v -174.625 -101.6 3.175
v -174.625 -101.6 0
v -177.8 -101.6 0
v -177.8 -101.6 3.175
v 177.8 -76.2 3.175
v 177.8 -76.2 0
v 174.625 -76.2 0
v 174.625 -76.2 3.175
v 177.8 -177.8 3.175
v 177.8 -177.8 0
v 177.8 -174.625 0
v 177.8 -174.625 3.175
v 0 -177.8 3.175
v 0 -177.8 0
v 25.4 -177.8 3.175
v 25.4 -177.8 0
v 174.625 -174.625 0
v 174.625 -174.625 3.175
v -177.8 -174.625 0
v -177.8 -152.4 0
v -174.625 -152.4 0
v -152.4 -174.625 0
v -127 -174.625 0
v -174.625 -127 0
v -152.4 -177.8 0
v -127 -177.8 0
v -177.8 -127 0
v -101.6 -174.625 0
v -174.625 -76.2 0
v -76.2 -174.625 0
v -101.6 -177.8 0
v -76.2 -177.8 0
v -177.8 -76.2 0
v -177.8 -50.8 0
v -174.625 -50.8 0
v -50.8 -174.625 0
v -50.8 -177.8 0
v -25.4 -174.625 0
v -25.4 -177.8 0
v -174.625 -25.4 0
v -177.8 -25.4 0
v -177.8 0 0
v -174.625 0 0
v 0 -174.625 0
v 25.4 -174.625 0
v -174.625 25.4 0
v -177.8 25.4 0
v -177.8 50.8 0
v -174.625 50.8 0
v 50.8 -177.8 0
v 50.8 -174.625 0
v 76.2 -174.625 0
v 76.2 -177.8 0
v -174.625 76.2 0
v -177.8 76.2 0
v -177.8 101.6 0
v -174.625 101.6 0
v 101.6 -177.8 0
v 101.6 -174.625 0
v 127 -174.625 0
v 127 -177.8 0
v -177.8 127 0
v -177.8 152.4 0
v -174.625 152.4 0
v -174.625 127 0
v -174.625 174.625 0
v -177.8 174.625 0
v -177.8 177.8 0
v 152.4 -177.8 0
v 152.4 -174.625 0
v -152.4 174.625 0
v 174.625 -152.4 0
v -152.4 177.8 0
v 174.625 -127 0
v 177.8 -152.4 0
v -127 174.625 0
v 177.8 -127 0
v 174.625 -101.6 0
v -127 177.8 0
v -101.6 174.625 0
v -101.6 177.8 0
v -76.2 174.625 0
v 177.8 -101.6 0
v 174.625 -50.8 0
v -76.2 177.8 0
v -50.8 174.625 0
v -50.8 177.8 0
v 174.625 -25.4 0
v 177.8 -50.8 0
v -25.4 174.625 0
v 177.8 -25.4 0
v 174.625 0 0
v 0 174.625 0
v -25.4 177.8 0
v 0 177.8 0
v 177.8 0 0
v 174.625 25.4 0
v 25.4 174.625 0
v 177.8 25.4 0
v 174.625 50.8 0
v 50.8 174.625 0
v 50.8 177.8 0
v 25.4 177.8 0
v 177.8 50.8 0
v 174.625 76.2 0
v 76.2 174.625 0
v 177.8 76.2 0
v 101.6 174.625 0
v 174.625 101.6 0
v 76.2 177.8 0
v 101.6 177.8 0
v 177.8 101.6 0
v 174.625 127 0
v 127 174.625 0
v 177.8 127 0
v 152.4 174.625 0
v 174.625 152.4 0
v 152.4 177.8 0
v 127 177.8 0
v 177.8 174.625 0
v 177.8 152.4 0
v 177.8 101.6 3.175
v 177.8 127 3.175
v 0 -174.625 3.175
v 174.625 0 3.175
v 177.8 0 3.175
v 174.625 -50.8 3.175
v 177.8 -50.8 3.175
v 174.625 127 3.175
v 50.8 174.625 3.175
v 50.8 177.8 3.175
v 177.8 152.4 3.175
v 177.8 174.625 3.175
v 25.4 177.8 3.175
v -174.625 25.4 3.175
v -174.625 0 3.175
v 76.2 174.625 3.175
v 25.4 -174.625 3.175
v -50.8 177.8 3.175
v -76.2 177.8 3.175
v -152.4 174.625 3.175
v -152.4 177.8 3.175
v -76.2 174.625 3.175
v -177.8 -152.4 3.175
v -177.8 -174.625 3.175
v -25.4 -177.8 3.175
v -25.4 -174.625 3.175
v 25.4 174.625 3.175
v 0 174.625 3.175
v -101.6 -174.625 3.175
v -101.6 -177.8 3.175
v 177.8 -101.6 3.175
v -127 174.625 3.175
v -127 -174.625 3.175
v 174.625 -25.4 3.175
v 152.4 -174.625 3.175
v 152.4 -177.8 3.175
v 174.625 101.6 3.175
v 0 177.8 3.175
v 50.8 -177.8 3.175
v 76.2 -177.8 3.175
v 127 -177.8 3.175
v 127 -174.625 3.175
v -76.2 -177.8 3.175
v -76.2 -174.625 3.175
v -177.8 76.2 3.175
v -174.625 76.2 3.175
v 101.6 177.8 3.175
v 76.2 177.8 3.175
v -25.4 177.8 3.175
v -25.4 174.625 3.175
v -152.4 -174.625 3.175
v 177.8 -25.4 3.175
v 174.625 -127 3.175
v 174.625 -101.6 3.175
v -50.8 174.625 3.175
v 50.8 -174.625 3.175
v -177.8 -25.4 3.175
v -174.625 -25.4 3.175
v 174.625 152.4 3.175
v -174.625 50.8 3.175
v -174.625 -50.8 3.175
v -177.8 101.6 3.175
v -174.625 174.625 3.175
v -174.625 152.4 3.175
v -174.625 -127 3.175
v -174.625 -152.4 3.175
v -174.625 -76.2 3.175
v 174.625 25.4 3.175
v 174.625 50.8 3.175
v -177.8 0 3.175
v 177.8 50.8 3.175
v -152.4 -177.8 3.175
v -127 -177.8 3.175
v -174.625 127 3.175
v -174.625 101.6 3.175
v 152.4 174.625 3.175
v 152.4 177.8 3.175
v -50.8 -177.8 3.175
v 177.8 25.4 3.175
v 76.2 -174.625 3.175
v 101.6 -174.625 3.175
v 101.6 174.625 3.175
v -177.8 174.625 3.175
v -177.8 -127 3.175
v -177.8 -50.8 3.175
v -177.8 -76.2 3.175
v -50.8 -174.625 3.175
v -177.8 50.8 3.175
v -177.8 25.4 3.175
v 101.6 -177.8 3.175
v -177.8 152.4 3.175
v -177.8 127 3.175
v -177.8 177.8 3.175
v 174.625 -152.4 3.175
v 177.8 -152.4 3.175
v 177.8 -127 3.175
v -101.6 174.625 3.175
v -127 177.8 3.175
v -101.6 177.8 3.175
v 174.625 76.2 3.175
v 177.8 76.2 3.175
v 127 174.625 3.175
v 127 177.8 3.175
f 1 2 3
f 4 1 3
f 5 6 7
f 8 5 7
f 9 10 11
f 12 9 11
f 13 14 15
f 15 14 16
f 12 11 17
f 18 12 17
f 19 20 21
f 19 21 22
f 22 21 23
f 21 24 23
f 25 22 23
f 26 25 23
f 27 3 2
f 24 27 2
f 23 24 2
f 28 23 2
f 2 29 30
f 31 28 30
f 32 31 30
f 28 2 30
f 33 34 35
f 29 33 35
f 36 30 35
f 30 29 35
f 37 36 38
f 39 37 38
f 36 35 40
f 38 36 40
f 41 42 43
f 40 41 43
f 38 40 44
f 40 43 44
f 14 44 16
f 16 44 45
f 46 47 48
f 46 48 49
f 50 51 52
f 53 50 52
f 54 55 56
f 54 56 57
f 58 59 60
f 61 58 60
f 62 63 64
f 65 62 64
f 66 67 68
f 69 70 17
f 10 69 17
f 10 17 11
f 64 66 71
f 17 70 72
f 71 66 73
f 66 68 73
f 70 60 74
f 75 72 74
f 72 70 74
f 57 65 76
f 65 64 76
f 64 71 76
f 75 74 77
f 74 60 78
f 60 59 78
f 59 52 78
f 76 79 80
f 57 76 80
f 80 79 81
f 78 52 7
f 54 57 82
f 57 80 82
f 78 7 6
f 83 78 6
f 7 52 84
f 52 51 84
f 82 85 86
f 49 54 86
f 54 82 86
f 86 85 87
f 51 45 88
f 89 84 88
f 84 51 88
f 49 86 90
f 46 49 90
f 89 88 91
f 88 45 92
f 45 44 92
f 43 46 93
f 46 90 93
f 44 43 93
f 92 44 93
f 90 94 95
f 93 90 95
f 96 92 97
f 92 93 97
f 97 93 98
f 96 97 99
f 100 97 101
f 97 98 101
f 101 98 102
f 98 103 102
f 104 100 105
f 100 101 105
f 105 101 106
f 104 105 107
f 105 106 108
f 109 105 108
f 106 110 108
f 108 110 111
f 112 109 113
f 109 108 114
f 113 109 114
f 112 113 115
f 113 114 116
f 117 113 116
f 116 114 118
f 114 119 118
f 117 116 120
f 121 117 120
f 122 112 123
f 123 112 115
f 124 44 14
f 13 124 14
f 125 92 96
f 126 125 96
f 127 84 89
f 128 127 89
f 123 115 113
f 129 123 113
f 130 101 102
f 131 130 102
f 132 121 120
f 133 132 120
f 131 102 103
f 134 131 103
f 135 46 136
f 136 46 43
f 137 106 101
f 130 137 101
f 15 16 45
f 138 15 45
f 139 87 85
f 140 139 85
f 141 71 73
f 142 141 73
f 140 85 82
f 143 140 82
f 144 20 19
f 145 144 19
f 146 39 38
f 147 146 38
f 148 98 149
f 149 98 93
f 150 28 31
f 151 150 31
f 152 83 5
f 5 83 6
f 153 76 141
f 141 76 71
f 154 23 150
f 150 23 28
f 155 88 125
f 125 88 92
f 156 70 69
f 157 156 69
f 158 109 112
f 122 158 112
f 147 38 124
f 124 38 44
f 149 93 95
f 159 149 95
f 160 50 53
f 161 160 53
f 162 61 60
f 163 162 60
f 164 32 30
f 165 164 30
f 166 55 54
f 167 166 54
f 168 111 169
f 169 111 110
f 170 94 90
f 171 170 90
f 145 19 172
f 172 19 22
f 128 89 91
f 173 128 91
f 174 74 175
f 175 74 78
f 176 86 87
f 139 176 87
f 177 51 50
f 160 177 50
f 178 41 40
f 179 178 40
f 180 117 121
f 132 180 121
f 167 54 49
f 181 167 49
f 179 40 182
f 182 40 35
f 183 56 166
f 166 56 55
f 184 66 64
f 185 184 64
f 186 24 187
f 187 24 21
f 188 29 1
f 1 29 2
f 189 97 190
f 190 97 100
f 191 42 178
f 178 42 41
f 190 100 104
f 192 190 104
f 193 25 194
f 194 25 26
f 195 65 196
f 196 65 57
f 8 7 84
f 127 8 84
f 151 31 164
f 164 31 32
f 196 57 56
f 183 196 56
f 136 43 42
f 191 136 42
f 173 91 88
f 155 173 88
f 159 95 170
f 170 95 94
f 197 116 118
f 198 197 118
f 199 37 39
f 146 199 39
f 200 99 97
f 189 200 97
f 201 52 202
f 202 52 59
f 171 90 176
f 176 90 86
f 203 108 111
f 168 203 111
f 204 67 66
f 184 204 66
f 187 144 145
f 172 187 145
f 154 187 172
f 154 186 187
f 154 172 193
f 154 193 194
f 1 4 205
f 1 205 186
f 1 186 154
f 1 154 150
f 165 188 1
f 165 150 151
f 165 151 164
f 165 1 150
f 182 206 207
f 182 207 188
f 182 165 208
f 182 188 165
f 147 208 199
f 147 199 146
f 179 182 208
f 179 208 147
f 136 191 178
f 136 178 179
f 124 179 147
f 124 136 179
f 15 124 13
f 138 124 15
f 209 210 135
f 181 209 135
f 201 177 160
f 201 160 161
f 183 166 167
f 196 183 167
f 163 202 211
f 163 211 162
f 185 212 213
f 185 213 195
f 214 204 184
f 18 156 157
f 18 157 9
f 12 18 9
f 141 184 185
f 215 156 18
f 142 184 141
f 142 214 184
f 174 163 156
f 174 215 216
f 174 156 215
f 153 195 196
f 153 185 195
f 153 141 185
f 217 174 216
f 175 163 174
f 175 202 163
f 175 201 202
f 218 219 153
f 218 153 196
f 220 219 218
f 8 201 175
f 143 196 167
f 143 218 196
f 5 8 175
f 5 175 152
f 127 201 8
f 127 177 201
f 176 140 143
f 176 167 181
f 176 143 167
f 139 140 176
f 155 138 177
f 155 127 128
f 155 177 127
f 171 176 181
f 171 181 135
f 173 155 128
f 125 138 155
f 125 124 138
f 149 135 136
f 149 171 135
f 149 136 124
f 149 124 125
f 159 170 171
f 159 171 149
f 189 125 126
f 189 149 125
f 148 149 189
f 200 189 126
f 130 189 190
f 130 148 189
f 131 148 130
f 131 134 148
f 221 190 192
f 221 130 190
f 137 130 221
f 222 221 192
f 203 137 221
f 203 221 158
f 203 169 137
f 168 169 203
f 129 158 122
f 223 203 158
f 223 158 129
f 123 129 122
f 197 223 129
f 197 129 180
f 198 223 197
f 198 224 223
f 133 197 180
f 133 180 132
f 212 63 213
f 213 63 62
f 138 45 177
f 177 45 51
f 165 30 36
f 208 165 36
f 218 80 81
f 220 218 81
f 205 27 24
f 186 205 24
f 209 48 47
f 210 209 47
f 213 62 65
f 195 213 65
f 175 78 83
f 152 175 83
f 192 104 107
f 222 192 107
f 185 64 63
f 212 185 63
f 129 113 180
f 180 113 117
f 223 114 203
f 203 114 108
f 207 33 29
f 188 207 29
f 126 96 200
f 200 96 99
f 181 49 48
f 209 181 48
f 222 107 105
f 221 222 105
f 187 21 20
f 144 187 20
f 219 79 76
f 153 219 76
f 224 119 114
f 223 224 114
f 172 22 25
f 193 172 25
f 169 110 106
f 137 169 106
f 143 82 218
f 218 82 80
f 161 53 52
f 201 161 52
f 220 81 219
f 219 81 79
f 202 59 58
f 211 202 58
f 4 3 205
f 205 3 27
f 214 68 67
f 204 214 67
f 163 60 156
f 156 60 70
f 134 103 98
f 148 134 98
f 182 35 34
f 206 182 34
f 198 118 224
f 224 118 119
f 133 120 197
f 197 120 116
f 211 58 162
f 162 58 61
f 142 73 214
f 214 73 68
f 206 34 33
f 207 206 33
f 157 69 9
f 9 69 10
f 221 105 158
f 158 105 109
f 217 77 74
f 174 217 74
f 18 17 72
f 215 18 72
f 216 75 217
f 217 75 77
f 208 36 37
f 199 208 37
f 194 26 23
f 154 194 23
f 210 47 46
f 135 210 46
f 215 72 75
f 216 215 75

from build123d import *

# Parameters (mm, degrees)
F1_DEPTH = 3.175


with BuildPart() as f1:
    # F0 (on Top) → F1 (new body)
    with BuildSketch(Plane.XY):
        Polygon((-152.4, 177.8), (-177.8, 177.8), (-177.8, 174.625), (-174.625, 174.625), (-174.625, 152.4), (-177.8, 152.4), (-177.8, 127), (-174.625, 127), (-174.625, 101.6), (-177.8, 101.6), (-177.8, 76.2), (-174.625, 76.2), (-174.625, 50.8), (-177.8, 50.8), (-177.8, 25.4), (-174.625, 25.4), (-174.625, 0), (-177.8, 0), (-177.8, -25.4), (-174.625, -25.4), (-174.625, -50.8), (-177.8, -50.8), (-177.8, -76.2), (-174.625, -76.2), (-174.625, -101.6), (-177.8, -101.6), (-177.8, -127), (-174.625, -127), (-174.625, -152.4), (-177.8, -152.4), (-177.8, -174.625), (-174.625, -174.625), (-152.4, -174.625), (-152.4, -177.8), (-127, -177.8), (-127, -174.625), (-101.6, -174.625), (-101.6, -177.8), (-76.2, -177.8), (-76.2, -174.625), (-50.8, -174.625), (-50.8, -177.8), (-25.4, -177.8), (-25.4, -174.625), (0, -174.625), (0, -177.8), (25.4, -177.8), (25.4, -174.625), (50.8, -174.625), (50.8, -177.8), (76.2, -177.8), (76.2, -174.625), (101.6, -174.625), (101.6, -177.8), (127, -177.8), (127, -174.625), (152.4, -174.625), (152.4, -177.8), (177.8, -177.8), (177.8, -174.625), (174.625, -174.625), (174.625, -152.4), (177.8, -152.4), (177.8, -127), (174.625, -127), (174.625, -101.6), (177.8, -101.6), (177.8, -76.2), (174.625, -76.2), (174.625, -50.8), (177.8, -50.8), (177.8, -25.4), (174.625, -25.4), (174.625, 0), (177.8, 0), (177.8, 25.4), (174.625, 25.4), (174.625, 50.8), (177.8, 50.8), (177.8, 76.2), (174.625, 76.2), (174.625, 101.6), (177.8, 101.6), (177.8, 127), (174.625, 127), (174.625, 152.4), (177.8, 152.4), (177.8, 174.625), (174.625, 174.625), (152.4, 174.625), (152.4, 177.8), (127, 177.8), (127, 174.625), (101.6, 174.625), (101.6, 177.8), (76.2, 177.8), (76.2, 174.625), (50.8, 174.625), (50.8, 177.8), (25.4, 177.8), (25.4, 174.625), (0, 174.625), (0, 177.8), (-25.4, 177.8), (-25.4, 174.625), (-50.8, 174.625), (-50.8, 177.8), (-76.2, 177.8), (-76.2, 174.625), (-101.6, 174.625), (-101.6, 177.8), (-127, 177.8), (-127, 174.625), (-152.4, 174.625), align=None)
    extrude(amount=F1_DEPTH)


solid = f1.part
